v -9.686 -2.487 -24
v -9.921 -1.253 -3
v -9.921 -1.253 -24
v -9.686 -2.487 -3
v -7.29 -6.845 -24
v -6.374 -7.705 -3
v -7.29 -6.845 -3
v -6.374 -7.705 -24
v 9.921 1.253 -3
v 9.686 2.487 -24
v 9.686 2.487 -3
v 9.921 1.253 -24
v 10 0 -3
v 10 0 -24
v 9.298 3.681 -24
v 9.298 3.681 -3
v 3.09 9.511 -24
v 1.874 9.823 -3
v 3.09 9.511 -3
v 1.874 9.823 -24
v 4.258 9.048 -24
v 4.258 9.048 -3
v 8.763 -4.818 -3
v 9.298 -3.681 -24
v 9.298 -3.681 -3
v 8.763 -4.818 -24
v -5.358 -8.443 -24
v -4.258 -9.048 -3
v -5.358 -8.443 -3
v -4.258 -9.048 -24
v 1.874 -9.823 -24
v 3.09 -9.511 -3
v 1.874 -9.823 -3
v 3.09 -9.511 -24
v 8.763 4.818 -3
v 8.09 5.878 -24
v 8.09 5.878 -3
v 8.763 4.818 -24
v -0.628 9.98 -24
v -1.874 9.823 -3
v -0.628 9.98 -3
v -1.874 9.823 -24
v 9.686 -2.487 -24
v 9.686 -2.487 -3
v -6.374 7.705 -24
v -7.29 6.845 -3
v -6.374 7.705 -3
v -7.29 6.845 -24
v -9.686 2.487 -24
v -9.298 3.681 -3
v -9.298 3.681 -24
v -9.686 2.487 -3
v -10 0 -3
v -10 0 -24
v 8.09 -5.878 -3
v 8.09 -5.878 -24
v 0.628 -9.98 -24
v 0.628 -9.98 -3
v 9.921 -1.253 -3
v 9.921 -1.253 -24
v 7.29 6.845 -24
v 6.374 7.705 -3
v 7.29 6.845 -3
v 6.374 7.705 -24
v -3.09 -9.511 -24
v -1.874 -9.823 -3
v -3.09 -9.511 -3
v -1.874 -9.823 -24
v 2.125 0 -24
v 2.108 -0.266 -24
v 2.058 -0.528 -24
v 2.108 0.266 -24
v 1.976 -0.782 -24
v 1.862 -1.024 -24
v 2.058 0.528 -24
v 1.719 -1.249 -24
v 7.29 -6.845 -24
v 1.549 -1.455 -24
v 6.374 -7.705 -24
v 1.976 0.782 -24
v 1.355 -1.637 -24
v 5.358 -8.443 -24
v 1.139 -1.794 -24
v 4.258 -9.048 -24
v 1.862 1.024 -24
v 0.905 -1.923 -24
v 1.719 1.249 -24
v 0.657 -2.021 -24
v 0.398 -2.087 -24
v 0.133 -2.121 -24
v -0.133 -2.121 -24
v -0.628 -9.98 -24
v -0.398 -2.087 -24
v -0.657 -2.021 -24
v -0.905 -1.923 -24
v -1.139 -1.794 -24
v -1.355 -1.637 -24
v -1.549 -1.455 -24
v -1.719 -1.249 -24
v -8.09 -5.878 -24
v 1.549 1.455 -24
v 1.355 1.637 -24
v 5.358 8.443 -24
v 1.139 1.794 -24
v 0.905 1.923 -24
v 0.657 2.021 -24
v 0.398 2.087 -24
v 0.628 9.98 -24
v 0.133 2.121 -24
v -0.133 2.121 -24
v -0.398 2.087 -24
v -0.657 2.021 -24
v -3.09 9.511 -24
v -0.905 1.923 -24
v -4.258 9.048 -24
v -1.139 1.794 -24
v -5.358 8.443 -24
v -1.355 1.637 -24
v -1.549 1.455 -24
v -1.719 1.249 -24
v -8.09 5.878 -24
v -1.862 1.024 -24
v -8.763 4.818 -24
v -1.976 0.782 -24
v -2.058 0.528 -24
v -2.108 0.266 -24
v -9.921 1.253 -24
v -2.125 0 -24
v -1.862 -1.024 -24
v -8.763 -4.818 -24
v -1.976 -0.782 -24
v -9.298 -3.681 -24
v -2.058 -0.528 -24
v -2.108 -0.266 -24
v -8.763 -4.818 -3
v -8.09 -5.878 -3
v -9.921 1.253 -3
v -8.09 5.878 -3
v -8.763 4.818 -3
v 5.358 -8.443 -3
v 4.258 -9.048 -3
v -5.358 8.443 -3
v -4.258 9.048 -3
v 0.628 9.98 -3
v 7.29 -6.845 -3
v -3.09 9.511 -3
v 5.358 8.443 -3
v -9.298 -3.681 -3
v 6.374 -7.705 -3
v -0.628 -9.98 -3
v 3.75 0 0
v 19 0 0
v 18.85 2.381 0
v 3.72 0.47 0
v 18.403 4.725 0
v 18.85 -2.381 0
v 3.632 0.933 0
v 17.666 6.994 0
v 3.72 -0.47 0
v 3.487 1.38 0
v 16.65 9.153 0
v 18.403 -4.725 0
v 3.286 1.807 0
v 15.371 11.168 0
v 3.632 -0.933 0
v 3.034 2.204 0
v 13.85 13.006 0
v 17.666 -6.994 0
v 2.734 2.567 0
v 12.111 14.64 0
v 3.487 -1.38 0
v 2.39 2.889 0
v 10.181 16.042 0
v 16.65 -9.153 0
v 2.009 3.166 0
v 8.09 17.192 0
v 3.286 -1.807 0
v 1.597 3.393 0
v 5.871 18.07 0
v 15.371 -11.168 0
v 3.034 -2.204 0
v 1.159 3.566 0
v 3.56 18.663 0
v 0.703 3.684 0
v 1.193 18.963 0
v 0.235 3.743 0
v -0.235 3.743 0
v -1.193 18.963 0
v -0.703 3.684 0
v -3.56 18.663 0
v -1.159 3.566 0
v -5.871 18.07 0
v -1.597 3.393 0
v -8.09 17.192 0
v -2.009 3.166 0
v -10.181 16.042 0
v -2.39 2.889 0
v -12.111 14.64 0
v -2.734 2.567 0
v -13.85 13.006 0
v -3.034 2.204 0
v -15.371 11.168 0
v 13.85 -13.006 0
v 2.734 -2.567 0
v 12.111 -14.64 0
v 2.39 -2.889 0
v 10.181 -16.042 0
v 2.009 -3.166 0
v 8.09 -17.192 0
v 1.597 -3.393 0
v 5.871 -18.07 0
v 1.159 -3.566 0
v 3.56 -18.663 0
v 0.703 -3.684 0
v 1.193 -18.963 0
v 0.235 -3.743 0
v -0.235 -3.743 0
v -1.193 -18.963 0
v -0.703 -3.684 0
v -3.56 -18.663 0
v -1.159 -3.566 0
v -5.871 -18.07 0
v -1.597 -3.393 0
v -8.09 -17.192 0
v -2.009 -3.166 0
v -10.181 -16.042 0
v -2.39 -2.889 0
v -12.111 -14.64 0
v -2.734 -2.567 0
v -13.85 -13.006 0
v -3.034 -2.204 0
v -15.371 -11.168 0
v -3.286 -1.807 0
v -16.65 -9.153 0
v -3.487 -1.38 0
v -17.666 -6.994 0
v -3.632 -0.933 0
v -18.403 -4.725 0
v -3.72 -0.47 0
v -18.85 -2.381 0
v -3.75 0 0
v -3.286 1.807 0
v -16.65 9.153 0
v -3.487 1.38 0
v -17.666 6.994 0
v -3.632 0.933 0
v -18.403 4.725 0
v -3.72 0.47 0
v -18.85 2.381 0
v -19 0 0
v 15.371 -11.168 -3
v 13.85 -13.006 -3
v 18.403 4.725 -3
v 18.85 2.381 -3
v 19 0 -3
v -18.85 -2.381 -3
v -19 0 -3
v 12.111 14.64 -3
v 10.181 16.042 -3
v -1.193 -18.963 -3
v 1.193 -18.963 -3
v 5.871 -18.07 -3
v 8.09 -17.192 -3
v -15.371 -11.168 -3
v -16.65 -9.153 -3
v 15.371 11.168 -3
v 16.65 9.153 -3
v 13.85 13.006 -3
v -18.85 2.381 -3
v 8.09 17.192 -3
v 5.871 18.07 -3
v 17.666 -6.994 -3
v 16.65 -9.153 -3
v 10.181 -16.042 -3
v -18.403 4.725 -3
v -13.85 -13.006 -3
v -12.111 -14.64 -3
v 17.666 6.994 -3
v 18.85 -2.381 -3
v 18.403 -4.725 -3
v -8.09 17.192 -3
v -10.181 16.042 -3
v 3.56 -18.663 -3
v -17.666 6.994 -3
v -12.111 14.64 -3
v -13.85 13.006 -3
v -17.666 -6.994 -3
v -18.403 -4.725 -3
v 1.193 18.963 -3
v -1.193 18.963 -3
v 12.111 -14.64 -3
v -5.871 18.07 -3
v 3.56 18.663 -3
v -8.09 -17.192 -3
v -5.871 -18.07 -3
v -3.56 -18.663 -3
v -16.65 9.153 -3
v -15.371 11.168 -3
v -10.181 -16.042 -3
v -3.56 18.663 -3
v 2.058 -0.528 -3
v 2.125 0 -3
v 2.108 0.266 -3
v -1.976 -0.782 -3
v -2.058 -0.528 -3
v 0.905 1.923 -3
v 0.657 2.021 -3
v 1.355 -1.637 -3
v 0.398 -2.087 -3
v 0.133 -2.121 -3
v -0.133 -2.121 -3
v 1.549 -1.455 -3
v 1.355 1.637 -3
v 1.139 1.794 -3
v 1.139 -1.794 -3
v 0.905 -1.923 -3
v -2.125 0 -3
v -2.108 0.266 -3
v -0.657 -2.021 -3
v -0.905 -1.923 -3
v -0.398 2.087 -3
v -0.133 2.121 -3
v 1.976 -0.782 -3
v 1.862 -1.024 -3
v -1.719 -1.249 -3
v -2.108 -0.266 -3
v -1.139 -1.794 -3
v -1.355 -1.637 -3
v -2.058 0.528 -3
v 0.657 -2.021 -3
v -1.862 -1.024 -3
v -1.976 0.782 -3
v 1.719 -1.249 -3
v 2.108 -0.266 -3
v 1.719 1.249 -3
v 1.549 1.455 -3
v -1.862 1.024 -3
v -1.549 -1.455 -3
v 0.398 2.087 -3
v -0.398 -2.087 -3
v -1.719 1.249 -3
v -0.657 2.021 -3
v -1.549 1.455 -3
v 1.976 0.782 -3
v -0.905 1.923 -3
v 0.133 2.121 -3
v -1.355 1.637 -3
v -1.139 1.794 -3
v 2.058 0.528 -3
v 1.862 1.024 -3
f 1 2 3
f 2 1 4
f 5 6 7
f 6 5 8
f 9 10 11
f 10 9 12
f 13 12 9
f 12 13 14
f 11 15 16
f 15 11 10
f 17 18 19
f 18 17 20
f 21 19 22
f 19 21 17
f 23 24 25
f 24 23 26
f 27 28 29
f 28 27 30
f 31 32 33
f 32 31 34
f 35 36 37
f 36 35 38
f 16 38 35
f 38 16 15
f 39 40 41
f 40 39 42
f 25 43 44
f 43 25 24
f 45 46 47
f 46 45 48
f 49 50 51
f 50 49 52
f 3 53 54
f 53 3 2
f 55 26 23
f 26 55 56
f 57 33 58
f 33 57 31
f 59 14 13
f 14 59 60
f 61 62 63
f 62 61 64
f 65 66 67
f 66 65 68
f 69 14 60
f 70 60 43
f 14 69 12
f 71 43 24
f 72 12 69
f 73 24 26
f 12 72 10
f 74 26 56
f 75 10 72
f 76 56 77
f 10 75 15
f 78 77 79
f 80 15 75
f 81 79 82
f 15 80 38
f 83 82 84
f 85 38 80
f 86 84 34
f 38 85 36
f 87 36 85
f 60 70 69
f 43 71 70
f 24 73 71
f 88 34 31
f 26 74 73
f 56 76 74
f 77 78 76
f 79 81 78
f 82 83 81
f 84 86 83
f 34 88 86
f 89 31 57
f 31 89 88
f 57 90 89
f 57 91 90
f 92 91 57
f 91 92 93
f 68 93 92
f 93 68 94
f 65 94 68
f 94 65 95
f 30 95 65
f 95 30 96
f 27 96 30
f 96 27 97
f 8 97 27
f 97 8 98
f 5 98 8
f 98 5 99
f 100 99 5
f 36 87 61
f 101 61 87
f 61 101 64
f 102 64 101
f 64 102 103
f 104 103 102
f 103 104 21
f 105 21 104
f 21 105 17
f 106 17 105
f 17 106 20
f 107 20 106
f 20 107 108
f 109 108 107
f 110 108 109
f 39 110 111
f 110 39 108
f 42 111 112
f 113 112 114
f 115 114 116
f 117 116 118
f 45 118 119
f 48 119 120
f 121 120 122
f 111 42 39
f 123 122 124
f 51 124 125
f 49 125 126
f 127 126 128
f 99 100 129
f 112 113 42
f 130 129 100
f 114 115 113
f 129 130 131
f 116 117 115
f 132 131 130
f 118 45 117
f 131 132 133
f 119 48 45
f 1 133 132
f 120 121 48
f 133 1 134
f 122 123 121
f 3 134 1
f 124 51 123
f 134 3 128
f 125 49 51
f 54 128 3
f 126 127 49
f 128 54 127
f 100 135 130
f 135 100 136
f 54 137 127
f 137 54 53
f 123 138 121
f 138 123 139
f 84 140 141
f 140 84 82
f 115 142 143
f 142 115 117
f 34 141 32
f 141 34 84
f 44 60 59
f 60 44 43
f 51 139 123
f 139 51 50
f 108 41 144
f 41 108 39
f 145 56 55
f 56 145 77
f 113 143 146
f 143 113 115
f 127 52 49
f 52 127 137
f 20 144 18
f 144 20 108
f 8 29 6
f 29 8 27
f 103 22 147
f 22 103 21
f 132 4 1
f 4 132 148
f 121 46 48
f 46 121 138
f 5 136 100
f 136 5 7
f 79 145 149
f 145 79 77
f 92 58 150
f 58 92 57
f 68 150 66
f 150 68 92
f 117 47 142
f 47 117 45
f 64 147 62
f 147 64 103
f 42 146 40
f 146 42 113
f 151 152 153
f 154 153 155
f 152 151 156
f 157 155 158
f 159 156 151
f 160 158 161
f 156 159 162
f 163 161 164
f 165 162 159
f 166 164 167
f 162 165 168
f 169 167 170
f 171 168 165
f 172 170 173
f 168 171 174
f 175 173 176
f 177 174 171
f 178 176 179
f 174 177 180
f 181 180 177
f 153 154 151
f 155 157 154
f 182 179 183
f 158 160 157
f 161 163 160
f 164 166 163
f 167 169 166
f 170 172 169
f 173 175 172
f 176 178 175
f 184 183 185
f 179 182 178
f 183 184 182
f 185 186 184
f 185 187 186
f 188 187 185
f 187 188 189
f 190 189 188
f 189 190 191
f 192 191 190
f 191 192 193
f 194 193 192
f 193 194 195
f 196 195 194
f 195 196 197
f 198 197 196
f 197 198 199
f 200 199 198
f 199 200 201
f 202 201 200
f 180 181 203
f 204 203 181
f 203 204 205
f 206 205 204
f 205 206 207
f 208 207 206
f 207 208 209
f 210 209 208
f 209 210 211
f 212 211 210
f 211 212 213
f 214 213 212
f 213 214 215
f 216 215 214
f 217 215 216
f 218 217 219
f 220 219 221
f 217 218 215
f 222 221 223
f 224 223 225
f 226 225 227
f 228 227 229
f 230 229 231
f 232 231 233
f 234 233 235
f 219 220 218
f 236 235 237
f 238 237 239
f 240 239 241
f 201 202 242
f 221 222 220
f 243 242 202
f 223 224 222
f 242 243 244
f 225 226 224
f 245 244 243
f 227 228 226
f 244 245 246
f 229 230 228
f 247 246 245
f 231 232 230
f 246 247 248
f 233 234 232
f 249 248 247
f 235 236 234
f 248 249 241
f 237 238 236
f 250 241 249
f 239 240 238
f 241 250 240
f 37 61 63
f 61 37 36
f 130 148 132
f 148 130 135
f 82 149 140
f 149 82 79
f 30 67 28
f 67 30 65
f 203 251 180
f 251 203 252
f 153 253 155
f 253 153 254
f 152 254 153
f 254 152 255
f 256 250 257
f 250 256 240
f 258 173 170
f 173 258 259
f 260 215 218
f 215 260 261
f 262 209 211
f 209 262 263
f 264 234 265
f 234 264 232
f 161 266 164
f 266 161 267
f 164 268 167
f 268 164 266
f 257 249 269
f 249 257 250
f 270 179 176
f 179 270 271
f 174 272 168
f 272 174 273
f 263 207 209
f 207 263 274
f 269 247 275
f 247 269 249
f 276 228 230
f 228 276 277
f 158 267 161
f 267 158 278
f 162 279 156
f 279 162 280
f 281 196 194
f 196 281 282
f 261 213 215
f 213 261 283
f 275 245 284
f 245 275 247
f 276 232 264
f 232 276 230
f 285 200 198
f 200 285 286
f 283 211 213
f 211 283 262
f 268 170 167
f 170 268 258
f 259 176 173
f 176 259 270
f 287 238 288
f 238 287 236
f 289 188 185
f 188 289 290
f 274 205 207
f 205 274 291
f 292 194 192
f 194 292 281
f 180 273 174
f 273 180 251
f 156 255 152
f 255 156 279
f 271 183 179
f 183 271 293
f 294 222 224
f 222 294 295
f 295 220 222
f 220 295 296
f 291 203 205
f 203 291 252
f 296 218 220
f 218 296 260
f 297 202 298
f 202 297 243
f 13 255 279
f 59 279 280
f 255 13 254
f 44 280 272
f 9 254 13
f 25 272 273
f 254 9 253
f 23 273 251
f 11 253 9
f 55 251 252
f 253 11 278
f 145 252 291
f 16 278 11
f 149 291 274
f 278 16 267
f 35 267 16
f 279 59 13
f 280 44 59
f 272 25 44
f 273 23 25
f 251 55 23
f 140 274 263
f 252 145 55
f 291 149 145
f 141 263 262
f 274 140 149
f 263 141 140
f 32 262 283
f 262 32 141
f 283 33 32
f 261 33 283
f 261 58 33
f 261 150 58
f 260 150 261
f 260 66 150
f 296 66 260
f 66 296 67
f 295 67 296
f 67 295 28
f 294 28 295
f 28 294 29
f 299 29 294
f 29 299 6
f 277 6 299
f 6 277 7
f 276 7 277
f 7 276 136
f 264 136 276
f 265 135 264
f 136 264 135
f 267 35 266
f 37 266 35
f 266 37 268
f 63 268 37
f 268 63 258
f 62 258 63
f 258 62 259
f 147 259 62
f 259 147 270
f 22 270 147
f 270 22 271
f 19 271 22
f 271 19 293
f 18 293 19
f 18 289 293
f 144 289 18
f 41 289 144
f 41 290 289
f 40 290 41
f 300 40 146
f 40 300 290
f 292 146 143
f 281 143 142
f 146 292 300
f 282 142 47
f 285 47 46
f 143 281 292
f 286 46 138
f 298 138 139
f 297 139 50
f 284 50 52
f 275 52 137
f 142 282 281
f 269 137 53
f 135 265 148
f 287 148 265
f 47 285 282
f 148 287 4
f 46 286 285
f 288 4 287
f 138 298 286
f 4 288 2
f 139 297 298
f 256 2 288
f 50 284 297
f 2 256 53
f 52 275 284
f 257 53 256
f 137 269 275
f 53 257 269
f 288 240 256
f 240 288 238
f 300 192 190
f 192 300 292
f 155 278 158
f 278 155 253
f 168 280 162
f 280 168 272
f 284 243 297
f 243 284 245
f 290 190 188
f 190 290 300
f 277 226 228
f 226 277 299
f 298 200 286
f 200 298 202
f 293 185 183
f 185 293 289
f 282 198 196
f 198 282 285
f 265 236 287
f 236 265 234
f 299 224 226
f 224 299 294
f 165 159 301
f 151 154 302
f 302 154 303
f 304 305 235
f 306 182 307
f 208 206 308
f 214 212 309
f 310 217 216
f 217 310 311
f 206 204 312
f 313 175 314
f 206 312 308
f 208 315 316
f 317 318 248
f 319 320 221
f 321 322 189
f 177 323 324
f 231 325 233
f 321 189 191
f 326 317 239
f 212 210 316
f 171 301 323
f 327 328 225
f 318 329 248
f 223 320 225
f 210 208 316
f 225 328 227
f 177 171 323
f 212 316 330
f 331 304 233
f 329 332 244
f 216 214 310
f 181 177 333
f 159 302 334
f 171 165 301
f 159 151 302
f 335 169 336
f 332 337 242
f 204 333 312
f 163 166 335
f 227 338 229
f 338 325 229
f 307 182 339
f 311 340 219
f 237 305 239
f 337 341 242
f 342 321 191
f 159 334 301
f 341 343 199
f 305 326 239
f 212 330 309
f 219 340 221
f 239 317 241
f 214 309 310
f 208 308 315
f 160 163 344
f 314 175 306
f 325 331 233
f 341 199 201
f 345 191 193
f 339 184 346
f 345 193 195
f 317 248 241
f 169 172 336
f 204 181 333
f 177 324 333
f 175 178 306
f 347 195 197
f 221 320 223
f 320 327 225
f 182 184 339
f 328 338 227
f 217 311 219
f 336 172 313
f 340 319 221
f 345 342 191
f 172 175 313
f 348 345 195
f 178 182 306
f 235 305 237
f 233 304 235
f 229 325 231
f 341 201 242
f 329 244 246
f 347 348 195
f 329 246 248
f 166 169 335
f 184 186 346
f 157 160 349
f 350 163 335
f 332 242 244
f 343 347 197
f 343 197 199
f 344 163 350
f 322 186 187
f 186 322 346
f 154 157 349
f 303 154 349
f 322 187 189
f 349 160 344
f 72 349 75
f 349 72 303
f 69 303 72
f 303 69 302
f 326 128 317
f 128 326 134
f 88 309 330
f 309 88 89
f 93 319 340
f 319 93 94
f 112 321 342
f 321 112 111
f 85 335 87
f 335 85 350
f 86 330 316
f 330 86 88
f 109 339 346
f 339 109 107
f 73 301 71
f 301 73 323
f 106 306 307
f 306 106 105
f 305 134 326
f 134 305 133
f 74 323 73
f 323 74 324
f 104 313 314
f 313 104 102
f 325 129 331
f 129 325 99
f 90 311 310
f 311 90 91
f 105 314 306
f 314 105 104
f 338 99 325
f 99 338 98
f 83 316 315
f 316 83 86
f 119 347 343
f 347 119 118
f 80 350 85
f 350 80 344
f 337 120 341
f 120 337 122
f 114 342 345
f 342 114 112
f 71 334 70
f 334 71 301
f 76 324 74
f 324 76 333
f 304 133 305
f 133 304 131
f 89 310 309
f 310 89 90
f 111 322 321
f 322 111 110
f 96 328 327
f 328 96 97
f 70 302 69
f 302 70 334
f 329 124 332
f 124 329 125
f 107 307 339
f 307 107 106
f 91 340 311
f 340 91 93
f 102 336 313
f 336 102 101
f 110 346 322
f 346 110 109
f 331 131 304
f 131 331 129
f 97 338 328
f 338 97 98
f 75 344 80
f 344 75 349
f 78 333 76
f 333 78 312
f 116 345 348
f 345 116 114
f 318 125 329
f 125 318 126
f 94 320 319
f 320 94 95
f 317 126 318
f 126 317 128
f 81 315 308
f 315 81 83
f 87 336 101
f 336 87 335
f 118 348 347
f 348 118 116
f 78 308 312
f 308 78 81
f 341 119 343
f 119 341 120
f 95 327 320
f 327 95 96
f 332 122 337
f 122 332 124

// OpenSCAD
$fn = 50;


difference() {
	union() {
		translate(v = [0, 0, -24.0000000000]) {
			cylinder(h = 24, r = 10.0000000000);
		}
		translate(v = [0, 0, -3.0000000000]) {
			cylinder(h = 3, r = 19.0000000000);
		}
	}
	union() {
		translate(v = [0, 0, 0]) {
			rotate(a = [0, 0, 0]) {
				difference() {
					union() {
						#translate(v = [0, 0, -24.0000000000]) {
							cylinder(h = 24, r = 2.0000000000);
						}
						#translate(v = [0, 0, -3]) {
							cylinder(h = 3, r1 = 2.1250000000, r2 = 3.7500000000);
						}
						#translate(v = [0, 0, -24.0000000000]) {
							cylinder(h = 24, r = 2.1250000000);
						}
						#translate(v = [0, 0, -24.0000000000]) {
							cylinder(h = 24, r = 2.0000000000);
						}
					}
					union();
				}
			}
		}
	}
}
